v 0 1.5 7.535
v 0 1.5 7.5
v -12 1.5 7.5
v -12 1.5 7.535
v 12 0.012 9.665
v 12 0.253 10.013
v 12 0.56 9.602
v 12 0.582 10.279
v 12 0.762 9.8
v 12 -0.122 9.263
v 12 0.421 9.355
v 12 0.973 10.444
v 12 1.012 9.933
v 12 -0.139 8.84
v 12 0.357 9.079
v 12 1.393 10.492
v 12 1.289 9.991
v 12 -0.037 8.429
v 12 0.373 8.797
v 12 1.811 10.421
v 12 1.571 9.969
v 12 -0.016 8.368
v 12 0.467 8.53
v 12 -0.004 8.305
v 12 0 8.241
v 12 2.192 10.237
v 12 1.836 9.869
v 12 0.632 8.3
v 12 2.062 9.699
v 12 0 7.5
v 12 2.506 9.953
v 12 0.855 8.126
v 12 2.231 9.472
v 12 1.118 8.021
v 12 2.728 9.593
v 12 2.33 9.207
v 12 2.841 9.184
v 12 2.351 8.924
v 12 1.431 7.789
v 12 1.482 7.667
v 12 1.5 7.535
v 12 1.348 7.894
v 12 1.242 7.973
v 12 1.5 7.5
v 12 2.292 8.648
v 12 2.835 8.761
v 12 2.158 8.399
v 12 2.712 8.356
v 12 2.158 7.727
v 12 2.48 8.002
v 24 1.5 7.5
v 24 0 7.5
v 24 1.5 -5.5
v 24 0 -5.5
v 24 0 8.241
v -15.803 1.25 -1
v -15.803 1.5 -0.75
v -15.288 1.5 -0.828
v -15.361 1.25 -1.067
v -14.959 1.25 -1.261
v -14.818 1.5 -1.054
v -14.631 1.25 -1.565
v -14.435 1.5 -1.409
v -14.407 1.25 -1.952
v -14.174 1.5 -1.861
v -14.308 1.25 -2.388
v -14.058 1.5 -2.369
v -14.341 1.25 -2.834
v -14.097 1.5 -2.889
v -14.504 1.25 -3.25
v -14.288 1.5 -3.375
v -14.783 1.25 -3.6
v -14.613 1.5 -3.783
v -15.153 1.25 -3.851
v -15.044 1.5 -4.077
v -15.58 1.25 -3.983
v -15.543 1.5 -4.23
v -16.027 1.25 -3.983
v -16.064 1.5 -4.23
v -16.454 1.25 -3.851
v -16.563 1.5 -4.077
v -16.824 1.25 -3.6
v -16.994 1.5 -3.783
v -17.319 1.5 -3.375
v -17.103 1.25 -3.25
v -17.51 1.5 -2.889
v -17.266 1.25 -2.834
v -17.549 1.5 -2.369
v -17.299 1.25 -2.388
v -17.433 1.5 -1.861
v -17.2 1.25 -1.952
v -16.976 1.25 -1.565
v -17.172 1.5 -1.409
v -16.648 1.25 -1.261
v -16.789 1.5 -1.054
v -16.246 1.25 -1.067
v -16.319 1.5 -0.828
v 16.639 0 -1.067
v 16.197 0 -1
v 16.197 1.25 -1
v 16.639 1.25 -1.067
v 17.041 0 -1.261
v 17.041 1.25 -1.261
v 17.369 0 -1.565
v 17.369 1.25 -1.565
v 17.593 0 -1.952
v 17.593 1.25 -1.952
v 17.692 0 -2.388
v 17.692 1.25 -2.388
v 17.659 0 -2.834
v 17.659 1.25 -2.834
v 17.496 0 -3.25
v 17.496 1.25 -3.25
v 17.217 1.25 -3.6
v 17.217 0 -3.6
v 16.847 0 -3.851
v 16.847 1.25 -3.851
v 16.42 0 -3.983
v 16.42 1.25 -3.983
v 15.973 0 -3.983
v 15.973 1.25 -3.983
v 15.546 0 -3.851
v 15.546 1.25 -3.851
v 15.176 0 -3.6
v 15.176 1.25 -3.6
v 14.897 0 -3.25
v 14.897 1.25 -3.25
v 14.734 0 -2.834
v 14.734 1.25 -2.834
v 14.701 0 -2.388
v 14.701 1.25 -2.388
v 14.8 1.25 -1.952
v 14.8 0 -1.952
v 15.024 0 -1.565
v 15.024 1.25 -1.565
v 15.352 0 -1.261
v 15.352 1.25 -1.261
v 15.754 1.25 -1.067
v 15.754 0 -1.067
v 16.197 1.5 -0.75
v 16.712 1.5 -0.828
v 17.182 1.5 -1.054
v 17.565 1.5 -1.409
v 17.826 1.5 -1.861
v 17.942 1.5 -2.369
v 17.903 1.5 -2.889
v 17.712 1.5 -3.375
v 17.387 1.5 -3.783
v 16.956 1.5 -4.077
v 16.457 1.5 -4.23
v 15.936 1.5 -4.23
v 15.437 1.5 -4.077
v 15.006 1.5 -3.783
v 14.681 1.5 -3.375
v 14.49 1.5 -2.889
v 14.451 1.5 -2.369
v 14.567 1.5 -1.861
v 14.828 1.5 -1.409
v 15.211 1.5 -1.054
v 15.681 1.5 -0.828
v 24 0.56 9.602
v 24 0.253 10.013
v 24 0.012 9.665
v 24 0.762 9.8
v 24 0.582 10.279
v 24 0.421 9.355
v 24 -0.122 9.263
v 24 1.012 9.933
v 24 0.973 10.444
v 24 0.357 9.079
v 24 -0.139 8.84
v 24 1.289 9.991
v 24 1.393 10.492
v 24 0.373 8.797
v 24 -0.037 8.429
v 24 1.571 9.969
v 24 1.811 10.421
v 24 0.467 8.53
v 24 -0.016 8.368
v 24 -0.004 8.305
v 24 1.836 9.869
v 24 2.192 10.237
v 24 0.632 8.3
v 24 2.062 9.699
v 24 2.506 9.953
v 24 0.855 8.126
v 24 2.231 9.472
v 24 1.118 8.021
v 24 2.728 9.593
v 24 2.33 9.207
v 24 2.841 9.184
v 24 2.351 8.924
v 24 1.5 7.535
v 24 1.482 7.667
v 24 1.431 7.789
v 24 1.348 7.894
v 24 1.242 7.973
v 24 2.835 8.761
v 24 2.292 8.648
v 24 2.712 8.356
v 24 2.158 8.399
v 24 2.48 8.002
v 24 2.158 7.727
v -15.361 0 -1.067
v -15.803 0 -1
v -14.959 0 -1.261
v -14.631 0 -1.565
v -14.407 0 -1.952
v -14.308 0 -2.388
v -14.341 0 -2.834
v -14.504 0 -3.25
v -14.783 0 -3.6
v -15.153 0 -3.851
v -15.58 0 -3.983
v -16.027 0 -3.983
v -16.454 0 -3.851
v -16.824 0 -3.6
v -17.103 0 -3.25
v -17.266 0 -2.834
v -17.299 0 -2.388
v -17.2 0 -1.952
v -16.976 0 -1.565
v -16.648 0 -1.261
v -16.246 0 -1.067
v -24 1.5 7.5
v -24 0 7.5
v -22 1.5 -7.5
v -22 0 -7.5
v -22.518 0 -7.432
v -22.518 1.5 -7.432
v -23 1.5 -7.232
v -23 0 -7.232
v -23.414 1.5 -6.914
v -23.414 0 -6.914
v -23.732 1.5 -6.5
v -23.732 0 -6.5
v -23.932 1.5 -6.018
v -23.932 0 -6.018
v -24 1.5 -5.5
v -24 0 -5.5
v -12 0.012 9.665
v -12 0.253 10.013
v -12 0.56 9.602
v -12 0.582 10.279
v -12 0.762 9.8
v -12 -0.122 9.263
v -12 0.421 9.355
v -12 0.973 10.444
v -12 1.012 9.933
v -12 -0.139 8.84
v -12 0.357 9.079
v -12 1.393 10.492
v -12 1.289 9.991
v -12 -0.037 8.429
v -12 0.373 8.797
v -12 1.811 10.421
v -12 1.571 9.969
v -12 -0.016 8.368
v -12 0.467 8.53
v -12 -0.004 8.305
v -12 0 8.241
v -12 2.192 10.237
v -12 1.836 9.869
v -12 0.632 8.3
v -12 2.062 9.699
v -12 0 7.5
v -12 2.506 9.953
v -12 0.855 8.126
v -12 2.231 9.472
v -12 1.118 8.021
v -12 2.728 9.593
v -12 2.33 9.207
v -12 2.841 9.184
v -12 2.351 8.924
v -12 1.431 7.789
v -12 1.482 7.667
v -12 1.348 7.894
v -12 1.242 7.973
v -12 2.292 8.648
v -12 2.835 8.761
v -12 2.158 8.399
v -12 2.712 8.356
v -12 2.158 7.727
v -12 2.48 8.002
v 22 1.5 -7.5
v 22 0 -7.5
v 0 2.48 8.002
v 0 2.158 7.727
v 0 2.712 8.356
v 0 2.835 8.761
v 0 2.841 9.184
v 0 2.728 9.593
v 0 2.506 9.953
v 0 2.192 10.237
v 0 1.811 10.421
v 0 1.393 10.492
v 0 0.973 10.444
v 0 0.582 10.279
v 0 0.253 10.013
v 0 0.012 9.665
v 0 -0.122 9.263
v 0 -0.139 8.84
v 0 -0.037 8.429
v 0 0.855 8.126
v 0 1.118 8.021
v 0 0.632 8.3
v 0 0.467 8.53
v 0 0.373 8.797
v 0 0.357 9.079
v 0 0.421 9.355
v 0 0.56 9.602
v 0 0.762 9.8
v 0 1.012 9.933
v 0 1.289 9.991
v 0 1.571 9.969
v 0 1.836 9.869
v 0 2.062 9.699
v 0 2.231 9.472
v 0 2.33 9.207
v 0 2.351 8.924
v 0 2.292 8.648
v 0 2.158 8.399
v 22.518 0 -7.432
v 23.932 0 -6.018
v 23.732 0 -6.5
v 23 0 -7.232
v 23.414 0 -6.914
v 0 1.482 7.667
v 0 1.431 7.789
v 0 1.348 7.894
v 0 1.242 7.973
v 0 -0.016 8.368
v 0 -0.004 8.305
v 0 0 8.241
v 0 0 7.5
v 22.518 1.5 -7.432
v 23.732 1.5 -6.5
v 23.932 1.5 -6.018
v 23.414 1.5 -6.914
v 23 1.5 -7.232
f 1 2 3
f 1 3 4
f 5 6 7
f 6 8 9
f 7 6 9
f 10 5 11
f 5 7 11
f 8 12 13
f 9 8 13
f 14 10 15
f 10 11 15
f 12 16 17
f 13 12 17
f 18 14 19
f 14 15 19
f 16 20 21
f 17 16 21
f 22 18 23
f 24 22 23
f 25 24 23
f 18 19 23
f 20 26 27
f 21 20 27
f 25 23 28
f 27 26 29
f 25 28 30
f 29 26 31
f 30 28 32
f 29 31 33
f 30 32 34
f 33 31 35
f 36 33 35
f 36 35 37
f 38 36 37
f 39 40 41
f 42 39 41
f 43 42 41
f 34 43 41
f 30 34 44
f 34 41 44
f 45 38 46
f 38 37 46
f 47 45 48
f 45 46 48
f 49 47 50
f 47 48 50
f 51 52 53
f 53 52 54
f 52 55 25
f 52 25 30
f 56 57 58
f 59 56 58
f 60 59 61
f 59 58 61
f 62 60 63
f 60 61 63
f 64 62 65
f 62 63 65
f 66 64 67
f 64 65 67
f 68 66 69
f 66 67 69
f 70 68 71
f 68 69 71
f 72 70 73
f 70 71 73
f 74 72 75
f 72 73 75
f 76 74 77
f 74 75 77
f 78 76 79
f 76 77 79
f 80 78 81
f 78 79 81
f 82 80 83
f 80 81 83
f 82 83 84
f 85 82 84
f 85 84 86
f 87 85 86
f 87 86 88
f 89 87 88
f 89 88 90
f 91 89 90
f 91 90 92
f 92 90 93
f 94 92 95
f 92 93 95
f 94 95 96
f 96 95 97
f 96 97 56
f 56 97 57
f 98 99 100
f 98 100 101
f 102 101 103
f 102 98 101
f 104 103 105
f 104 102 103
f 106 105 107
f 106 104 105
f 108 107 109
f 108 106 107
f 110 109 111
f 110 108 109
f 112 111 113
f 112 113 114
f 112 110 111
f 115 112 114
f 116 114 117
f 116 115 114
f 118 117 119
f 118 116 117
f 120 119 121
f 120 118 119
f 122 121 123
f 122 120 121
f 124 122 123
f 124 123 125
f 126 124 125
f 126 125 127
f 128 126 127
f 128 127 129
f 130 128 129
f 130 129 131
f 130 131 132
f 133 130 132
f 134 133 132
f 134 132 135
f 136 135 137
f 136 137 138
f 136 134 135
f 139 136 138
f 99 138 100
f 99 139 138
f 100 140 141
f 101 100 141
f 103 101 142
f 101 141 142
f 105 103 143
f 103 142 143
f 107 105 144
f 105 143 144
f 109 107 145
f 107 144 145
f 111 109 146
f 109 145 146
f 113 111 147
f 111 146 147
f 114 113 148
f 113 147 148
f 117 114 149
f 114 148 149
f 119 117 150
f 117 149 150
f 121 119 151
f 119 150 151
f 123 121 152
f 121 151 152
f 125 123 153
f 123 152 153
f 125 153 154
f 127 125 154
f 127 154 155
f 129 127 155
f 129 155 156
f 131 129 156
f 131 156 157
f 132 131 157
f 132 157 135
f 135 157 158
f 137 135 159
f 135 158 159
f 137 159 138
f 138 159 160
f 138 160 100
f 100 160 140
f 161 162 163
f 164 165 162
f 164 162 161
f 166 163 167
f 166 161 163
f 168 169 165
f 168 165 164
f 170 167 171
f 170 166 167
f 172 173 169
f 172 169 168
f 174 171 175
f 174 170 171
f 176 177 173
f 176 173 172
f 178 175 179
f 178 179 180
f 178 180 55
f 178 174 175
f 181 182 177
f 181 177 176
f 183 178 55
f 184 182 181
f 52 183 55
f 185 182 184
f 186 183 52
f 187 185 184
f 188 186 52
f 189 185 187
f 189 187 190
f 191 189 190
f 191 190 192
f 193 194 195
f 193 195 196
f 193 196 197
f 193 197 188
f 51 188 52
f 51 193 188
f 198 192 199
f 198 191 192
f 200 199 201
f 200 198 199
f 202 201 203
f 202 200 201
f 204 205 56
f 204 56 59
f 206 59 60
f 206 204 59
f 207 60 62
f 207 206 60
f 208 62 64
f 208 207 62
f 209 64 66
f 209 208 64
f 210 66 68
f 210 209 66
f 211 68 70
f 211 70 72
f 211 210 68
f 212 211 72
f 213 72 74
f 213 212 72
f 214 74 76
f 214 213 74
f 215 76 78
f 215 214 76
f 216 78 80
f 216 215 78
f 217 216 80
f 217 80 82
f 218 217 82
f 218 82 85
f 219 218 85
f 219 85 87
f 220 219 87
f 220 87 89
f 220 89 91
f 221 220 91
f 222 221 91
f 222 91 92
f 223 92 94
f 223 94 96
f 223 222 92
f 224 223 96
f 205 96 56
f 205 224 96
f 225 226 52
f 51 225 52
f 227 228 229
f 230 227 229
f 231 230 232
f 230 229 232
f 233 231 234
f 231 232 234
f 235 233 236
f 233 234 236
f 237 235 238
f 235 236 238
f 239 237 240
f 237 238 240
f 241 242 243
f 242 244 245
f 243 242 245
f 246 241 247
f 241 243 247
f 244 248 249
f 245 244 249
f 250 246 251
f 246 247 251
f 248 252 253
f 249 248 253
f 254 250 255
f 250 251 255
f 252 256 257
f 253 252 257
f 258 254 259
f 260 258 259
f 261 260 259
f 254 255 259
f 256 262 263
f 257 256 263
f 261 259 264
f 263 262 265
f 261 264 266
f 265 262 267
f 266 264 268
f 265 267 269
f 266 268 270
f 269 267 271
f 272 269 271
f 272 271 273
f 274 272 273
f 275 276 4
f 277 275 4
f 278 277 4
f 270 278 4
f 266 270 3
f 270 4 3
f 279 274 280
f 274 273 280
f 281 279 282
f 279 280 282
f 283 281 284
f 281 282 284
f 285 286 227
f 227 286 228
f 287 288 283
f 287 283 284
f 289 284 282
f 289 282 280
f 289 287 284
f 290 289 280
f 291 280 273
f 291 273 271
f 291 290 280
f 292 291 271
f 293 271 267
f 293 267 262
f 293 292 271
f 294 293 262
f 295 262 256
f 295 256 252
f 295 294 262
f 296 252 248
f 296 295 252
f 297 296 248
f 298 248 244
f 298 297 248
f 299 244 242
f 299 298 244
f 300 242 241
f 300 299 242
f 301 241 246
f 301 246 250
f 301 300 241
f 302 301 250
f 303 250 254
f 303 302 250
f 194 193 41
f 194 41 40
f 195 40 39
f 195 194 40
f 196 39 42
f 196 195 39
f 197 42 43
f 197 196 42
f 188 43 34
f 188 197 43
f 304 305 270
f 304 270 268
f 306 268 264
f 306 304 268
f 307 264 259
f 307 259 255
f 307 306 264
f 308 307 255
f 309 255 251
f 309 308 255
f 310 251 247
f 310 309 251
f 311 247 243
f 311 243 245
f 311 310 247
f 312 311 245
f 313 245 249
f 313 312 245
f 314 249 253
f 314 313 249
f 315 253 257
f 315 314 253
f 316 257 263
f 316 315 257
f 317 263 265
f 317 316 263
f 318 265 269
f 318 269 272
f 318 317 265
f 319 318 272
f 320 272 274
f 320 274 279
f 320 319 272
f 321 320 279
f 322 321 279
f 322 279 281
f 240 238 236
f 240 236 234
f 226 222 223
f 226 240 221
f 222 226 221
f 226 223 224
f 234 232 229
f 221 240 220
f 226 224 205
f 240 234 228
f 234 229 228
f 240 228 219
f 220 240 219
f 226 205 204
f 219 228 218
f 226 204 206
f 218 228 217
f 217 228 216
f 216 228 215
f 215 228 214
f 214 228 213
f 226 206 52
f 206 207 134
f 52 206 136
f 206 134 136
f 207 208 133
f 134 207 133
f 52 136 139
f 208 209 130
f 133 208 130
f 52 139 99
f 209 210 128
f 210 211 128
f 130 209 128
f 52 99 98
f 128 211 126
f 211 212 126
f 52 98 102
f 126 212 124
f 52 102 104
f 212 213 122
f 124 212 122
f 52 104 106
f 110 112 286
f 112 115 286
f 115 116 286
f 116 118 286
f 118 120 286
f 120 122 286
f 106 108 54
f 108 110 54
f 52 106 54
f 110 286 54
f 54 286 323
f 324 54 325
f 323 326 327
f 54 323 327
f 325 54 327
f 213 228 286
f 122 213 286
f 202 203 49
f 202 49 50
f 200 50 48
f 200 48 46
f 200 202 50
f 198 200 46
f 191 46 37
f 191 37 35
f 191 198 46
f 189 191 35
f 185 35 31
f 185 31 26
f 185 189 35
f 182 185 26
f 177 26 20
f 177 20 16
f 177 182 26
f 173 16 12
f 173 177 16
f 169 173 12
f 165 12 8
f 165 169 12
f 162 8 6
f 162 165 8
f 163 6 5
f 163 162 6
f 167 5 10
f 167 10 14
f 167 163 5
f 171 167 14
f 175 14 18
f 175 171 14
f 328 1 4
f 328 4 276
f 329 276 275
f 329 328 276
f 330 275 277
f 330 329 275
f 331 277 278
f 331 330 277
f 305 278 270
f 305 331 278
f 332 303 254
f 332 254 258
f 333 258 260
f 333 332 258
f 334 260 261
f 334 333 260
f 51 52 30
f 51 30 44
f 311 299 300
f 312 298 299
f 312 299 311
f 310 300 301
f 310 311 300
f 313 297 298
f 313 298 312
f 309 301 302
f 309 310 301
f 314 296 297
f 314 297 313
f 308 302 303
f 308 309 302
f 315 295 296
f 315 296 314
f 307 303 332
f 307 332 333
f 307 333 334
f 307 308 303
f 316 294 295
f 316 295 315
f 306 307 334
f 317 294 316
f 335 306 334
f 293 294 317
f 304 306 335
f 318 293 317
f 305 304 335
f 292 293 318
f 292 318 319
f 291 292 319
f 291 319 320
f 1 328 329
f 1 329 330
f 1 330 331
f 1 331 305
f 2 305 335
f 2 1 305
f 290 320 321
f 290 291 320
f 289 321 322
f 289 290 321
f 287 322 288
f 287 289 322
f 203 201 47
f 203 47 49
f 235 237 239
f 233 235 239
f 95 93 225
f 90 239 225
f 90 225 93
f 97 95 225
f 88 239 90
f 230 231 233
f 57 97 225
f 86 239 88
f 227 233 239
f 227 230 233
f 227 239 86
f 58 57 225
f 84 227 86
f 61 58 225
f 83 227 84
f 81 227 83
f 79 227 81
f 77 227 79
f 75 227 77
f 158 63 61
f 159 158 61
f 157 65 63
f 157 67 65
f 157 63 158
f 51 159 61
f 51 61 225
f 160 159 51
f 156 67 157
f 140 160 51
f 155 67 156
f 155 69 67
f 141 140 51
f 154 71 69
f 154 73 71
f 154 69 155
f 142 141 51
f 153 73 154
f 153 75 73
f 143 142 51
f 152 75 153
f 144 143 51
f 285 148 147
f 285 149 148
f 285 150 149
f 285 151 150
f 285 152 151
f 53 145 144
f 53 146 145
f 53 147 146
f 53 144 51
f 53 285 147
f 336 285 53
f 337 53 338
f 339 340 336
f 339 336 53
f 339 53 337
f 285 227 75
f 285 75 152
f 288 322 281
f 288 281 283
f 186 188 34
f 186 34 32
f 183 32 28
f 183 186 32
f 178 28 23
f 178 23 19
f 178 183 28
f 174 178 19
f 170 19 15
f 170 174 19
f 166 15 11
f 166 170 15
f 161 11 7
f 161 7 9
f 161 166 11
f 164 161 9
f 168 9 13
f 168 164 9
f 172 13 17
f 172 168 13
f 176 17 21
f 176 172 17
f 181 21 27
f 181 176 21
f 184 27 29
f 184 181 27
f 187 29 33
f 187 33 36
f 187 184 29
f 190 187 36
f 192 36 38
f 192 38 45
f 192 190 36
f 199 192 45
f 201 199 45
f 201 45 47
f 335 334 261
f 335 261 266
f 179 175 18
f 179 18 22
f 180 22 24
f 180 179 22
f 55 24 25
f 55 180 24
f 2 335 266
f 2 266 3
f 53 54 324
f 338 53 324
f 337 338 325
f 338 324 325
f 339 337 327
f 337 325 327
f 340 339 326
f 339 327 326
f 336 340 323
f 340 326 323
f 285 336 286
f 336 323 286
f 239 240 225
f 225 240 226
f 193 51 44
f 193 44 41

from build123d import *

# Parameters (mm, degrees)
SKETCH1_R           = 1.5
BOSS_EXTRUDE1_DEPTH = 1.5
BOSS_EXTRUDE2_DEPTH = 12
LPATTERN1_COUNT     = 2
LPATTERN1_PITCH     = 24
CHAMFER1_SIZE       = 0.25


with BuildPart() as part:
    # Sketch1 → Boss-Extrude1 (new body)
    with BuildSketch(Plane(origin=(0, 0, 0), x_dir=(1, 0, 0), z_dir=(0, 1, 0))):
        with BuildLine():
            Line((-24, -7.5), (24, -7.5))
            Line((24, -7.5), (24, 5.5))
            ThreePointArc((24, 5.5), (23.414213562, 6.914213562), (22, 7.5))
            Line((22, 7.5), (-22, 7.5))
            ThreePointArc((-22, 7.5), (-23.414213562, 6.914213562), (-24, 5.5))
            Line((-24, 5.5), (-24, -7.5))
        make_face()
        with Locations(Location((-15.803480629, 2.5, 0), (0, 0, 270))):
            Circle(SKETCH1_R, mode=Mode.SUBTRACT)
        with Locations(Location((16.196519371, 2.5, 0), (0, 0, 270))):
            Circle(SKETCH1_R, mode=Mode.SUBTRACT)
    extrude(amount=BOSS_EXTRUDE1_DEPTH)

    # Chamfer1
    chamfer1_edges = [part.edges().sort_by_distance(p)[0] for p in [
        (-15.803480629, 1.5, -4),
        (16.196519371, 1.5, -4),
    ]]
    chamfer(chamfer1_edges, length=CHAMFER1_SIZE)


with BuildPart() as body_2:
    # Sketch2 → Boss-Extrude2 (new body)
    with BuildSketch(Plane(origin=(24, 0, 0), x_dir=(0, 0, -1), z_dir=(1, 0, 0))):
        with BuildLine():
            ThreePointArc((-8.020968355, 1.117799371), (-9.932757452, 1.012054769), (-8.398619051, 2.157715643))
            Line((-8.398619051, 2.157715643), (-7.726693459, 2.157715643))
            ThreePointArc((-7.726693459, 2.157715643), (-10.421413085, 1.810692644), (-8.429112346, -0.036650472))
            ThreePointArc((-8.429112346, -0.036650472), (-8.336931769, -0.009248146), (-8.241210204, 0))
            Line((-8.241210204, 0), (-7.5, 0))
            Line((-7.5, 0), (-7.5, 1.206796223))
            Line((-7.5, 1.206796223), (-7.5, 1.5))
            Line((-7.5, 1.5), (-7.535043146, 1.5))
            ThreePointArc((-7.535043146, 1.5), (-7.844155031, 1.393001072), (-8.020968355, 1.117799371))
        make_face()
    boss_extrude2 = extrude(amount=-BOSS_EXTRUDE2_DEPTH)


with BuildPart() as lpattern1_1:
    # LPattern1: Boss-Extrude2 ×2
    with Locations(*[(-i * LPATTERN1_PITCH, 0, 0) for i in range(1, LPATTERN1_COUNT)]):
        add(boss_extrude2)


solid = Compound([part.part, body_2.part, lpattern1_1.part])
